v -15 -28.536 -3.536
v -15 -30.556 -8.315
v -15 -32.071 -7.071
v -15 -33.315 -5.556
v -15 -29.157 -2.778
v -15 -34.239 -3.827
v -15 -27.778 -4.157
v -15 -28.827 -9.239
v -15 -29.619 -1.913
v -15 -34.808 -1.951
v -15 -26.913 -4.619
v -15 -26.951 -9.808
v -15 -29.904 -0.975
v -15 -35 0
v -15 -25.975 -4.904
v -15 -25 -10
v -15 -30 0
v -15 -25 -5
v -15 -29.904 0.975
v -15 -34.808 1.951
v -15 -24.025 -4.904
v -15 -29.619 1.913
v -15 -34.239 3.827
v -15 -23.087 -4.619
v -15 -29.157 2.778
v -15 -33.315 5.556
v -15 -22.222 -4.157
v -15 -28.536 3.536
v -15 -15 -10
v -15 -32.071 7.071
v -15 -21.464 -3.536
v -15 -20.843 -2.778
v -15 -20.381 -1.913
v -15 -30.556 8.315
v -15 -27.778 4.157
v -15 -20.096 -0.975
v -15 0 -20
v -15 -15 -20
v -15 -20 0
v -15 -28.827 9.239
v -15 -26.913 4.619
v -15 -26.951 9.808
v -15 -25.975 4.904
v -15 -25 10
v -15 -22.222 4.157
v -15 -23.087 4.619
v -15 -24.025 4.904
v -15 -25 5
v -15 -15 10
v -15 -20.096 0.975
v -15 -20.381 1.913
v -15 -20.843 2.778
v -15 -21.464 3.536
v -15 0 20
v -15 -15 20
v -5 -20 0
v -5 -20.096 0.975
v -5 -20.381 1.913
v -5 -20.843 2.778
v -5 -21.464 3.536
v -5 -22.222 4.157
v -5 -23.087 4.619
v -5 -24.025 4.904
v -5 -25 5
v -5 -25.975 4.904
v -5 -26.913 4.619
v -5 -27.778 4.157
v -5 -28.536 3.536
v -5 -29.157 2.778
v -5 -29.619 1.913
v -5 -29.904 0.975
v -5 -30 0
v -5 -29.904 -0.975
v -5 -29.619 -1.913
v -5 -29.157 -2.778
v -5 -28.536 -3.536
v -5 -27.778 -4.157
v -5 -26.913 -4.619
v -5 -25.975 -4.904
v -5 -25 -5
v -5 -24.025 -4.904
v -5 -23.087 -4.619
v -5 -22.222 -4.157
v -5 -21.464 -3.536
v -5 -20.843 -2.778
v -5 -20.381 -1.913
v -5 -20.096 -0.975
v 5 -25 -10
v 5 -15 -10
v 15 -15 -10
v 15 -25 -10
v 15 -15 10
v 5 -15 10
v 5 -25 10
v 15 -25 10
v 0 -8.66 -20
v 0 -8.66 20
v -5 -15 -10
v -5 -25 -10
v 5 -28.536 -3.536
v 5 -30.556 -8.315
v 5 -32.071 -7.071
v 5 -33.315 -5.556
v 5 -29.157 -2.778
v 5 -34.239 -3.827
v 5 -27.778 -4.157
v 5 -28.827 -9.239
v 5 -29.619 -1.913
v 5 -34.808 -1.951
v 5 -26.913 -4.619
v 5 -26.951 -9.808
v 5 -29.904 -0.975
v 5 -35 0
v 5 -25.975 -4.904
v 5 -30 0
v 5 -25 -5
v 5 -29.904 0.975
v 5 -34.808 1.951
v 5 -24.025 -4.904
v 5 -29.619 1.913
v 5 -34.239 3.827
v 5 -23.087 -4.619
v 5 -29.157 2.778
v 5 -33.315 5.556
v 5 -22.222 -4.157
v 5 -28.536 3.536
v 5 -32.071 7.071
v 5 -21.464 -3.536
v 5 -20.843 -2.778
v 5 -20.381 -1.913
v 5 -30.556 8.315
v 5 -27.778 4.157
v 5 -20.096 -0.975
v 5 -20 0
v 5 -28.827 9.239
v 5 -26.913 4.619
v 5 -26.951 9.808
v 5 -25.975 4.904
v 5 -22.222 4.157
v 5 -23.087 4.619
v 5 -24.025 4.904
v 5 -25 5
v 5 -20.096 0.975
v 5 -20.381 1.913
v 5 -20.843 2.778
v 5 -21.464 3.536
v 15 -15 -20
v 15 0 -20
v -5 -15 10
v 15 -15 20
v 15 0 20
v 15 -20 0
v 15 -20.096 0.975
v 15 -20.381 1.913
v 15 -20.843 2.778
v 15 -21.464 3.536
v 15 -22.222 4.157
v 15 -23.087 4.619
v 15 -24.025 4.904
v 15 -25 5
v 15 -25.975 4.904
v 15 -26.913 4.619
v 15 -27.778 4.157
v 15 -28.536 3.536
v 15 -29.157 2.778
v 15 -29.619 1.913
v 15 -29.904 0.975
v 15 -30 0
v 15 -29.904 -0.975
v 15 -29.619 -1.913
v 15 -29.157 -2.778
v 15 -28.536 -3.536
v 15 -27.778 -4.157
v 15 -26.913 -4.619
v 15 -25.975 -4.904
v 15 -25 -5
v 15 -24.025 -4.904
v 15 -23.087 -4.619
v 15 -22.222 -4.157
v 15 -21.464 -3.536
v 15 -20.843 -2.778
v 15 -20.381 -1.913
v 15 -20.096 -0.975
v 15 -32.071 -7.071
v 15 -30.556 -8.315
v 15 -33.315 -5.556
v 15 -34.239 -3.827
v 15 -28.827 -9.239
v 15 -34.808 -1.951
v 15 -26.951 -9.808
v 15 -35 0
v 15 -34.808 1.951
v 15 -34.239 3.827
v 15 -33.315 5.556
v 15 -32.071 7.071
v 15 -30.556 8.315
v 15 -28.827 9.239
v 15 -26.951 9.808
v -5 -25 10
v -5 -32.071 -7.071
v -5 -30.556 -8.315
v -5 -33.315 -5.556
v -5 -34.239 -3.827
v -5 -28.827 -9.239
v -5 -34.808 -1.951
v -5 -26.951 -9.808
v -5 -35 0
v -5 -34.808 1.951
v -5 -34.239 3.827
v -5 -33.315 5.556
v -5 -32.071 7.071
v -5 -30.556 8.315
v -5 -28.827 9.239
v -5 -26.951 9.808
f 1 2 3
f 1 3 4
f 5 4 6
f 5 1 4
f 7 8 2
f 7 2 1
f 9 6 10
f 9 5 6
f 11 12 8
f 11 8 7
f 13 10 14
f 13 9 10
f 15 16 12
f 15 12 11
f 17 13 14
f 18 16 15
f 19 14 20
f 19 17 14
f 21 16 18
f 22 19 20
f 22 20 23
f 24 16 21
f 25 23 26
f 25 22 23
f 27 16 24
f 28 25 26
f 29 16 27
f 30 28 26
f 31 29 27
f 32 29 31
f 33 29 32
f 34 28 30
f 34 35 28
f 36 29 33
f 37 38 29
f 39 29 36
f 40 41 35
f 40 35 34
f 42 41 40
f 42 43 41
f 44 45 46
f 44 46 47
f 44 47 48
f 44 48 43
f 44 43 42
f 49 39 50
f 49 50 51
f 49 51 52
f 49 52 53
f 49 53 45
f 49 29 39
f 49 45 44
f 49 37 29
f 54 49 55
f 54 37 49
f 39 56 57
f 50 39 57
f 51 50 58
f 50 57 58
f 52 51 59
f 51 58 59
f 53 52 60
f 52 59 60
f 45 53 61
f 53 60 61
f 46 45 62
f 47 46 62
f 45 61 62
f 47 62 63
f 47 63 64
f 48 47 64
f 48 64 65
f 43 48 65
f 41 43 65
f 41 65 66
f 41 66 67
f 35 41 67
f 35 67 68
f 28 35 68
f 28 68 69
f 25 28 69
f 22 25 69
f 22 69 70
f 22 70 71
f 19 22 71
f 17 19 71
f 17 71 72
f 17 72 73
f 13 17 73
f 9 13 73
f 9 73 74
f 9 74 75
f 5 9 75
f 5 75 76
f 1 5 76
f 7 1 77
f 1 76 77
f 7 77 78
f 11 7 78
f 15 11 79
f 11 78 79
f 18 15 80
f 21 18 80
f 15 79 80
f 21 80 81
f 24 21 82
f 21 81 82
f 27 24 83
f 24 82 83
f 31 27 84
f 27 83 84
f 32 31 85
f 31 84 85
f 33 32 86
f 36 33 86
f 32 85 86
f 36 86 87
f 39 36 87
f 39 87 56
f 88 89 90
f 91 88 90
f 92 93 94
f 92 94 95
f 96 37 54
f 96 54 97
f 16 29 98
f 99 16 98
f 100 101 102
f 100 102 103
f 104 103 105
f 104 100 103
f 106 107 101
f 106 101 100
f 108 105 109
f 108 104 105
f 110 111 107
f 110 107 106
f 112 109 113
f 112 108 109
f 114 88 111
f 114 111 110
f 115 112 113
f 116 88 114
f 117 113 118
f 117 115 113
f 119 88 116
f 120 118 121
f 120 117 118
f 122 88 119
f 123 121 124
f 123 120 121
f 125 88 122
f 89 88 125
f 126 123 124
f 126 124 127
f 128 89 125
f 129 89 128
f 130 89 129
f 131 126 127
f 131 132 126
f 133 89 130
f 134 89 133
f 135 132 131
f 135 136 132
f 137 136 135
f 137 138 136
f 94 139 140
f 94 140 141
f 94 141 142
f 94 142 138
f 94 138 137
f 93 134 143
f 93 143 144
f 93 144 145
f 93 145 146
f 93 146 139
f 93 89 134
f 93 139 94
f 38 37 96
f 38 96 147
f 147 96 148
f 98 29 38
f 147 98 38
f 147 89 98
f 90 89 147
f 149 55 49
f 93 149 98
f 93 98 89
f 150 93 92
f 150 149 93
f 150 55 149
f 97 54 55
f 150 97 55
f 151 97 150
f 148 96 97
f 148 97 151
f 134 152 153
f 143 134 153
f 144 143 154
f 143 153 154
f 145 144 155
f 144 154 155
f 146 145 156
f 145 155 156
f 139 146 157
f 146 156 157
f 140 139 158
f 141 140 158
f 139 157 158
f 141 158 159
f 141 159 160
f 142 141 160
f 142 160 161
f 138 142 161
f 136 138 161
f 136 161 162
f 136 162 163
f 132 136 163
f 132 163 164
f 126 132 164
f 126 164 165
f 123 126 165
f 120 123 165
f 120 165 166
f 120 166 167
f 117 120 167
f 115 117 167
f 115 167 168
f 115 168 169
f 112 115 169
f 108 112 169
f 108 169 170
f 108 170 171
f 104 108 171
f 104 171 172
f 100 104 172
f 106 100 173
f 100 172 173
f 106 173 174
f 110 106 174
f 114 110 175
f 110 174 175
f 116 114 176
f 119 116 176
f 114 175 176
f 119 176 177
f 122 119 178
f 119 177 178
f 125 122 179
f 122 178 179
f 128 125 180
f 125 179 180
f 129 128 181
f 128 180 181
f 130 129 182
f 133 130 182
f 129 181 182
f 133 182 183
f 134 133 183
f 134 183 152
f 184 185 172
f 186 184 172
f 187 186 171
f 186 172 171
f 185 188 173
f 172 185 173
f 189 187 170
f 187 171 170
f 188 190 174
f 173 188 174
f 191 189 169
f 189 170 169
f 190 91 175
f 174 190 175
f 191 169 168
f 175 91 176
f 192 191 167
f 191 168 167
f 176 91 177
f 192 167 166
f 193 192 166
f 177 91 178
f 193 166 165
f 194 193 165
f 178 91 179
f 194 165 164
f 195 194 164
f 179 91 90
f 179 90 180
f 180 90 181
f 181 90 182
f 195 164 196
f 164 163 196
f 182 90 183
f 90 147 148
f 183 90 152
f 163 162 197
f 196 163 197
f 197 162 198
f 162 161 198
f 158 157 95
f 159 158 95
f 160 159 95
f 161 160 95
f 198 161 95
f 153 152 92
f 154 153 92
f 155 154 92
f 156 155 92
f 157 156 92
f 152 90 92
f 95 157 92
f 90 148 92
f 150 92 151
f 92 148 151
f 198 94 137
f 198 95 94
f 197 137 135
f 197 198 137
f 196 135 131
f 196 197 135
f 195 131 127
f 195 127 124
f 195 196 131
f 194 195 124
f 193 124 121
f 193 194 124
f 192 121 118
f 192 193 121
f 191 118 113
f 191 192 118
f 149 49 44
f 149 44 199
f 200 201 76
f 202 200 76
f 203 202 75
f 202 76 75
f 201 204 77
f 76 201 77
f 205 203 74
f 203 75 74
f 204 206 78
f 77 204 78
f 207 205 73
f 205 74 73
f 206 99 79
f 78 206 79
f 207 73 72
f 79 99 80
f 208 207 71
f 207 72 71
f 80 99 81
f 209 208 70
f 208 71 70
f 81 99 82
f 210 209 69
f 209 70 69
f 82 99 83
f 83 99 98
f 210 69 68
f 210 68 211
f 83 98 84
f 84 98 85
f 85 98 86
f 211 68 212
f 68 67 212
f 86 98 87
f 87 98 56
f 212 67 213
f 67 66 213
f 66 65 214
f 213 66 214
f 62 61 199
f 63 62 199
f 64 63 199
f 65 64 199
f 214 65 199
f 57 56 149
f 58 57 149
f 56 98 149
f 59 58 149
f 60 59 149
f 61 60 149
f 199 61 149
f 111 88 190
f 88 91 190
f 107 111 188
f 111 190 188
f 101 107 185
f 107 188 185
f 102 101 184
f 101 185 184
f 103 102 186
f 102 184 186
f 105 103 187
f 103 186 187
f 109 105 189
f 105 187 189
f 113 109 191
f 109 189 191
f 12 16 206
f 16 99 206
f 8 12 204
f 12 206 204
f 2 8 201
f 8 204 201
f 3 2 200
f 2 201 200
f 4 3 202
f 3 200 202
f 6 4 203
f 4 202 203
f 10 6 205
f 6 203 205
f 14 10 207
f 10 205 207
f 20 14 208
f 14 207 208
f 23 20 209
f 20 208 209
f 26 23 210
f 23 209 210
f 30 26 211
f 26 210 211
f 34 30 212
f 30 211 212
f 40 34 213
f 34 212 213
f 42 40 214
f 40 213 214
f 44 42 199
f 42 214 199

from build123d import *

# Parameters (mm, degrees)
F0_W     = 30
F0_H     = 40
F1_DEPTH = 15
F2_W     = 10
F2_H     = 20
F3_DEPTH = 20
F4_R     = 5
F5_DEPTH = 30.001
F6_R     = 9.99999
F8_DEPTH = 40.001


# Not quite as in the source:
# - a fillet or chamfer is up to 0.001 mm smaller than in the source, because OpenCascade refuses the exact size


with BuildPart() as f1:
    # F0 (on Front) → F1 (new body)
    with BuildSketch(Plane.XZ):
        Rectangle(F0_W, F0_H)
    extrude(amount=F1_DEPTH)

    # F2 (on face) → F3 (join)
    with BuildSketch(Plane.XZ.offset(15)):
        with Locations((-10, 0)):
            Rectangle(F2_W, F2_H)
        with Locations((10, 0)):
            Rectangle(F2_W, F2_H)
    extrude(amount=F3_DEPTH)

    # F4 (on face) → F5 (cut, through all)
    with BuildSketch(Plane.YZ.offset(15)):
        with Locations((-25, 0)):
            Circle(F4_R)
    extrude(amount=-F5_DEPTH, mode=Mode.SUBTRACT)

    # F6 (radius 10 in the source; OpenCascade refuses exactly that, so slightly less here)
    f6_edges = [f1.edges().sort_by_distance(p)[0] for p in [
        (10, -35, 10),
        (-10, -35, 10),
        (-10, -35, -10),
        (10, -35, -10),
    ]]
    fillet(f6_edges, radius=F6_R)

    # F7 (on face) → F8 (cut, through all)
    with BuildSketch(Plane.XY.offset(20)):
        Polygon((15, 0), (-15, 0), (0, -8.6602540378), align=None)
    extrude(amount=-F8_DEPTH, mode=Mode.SUBTRACT)


solid = f1.part
